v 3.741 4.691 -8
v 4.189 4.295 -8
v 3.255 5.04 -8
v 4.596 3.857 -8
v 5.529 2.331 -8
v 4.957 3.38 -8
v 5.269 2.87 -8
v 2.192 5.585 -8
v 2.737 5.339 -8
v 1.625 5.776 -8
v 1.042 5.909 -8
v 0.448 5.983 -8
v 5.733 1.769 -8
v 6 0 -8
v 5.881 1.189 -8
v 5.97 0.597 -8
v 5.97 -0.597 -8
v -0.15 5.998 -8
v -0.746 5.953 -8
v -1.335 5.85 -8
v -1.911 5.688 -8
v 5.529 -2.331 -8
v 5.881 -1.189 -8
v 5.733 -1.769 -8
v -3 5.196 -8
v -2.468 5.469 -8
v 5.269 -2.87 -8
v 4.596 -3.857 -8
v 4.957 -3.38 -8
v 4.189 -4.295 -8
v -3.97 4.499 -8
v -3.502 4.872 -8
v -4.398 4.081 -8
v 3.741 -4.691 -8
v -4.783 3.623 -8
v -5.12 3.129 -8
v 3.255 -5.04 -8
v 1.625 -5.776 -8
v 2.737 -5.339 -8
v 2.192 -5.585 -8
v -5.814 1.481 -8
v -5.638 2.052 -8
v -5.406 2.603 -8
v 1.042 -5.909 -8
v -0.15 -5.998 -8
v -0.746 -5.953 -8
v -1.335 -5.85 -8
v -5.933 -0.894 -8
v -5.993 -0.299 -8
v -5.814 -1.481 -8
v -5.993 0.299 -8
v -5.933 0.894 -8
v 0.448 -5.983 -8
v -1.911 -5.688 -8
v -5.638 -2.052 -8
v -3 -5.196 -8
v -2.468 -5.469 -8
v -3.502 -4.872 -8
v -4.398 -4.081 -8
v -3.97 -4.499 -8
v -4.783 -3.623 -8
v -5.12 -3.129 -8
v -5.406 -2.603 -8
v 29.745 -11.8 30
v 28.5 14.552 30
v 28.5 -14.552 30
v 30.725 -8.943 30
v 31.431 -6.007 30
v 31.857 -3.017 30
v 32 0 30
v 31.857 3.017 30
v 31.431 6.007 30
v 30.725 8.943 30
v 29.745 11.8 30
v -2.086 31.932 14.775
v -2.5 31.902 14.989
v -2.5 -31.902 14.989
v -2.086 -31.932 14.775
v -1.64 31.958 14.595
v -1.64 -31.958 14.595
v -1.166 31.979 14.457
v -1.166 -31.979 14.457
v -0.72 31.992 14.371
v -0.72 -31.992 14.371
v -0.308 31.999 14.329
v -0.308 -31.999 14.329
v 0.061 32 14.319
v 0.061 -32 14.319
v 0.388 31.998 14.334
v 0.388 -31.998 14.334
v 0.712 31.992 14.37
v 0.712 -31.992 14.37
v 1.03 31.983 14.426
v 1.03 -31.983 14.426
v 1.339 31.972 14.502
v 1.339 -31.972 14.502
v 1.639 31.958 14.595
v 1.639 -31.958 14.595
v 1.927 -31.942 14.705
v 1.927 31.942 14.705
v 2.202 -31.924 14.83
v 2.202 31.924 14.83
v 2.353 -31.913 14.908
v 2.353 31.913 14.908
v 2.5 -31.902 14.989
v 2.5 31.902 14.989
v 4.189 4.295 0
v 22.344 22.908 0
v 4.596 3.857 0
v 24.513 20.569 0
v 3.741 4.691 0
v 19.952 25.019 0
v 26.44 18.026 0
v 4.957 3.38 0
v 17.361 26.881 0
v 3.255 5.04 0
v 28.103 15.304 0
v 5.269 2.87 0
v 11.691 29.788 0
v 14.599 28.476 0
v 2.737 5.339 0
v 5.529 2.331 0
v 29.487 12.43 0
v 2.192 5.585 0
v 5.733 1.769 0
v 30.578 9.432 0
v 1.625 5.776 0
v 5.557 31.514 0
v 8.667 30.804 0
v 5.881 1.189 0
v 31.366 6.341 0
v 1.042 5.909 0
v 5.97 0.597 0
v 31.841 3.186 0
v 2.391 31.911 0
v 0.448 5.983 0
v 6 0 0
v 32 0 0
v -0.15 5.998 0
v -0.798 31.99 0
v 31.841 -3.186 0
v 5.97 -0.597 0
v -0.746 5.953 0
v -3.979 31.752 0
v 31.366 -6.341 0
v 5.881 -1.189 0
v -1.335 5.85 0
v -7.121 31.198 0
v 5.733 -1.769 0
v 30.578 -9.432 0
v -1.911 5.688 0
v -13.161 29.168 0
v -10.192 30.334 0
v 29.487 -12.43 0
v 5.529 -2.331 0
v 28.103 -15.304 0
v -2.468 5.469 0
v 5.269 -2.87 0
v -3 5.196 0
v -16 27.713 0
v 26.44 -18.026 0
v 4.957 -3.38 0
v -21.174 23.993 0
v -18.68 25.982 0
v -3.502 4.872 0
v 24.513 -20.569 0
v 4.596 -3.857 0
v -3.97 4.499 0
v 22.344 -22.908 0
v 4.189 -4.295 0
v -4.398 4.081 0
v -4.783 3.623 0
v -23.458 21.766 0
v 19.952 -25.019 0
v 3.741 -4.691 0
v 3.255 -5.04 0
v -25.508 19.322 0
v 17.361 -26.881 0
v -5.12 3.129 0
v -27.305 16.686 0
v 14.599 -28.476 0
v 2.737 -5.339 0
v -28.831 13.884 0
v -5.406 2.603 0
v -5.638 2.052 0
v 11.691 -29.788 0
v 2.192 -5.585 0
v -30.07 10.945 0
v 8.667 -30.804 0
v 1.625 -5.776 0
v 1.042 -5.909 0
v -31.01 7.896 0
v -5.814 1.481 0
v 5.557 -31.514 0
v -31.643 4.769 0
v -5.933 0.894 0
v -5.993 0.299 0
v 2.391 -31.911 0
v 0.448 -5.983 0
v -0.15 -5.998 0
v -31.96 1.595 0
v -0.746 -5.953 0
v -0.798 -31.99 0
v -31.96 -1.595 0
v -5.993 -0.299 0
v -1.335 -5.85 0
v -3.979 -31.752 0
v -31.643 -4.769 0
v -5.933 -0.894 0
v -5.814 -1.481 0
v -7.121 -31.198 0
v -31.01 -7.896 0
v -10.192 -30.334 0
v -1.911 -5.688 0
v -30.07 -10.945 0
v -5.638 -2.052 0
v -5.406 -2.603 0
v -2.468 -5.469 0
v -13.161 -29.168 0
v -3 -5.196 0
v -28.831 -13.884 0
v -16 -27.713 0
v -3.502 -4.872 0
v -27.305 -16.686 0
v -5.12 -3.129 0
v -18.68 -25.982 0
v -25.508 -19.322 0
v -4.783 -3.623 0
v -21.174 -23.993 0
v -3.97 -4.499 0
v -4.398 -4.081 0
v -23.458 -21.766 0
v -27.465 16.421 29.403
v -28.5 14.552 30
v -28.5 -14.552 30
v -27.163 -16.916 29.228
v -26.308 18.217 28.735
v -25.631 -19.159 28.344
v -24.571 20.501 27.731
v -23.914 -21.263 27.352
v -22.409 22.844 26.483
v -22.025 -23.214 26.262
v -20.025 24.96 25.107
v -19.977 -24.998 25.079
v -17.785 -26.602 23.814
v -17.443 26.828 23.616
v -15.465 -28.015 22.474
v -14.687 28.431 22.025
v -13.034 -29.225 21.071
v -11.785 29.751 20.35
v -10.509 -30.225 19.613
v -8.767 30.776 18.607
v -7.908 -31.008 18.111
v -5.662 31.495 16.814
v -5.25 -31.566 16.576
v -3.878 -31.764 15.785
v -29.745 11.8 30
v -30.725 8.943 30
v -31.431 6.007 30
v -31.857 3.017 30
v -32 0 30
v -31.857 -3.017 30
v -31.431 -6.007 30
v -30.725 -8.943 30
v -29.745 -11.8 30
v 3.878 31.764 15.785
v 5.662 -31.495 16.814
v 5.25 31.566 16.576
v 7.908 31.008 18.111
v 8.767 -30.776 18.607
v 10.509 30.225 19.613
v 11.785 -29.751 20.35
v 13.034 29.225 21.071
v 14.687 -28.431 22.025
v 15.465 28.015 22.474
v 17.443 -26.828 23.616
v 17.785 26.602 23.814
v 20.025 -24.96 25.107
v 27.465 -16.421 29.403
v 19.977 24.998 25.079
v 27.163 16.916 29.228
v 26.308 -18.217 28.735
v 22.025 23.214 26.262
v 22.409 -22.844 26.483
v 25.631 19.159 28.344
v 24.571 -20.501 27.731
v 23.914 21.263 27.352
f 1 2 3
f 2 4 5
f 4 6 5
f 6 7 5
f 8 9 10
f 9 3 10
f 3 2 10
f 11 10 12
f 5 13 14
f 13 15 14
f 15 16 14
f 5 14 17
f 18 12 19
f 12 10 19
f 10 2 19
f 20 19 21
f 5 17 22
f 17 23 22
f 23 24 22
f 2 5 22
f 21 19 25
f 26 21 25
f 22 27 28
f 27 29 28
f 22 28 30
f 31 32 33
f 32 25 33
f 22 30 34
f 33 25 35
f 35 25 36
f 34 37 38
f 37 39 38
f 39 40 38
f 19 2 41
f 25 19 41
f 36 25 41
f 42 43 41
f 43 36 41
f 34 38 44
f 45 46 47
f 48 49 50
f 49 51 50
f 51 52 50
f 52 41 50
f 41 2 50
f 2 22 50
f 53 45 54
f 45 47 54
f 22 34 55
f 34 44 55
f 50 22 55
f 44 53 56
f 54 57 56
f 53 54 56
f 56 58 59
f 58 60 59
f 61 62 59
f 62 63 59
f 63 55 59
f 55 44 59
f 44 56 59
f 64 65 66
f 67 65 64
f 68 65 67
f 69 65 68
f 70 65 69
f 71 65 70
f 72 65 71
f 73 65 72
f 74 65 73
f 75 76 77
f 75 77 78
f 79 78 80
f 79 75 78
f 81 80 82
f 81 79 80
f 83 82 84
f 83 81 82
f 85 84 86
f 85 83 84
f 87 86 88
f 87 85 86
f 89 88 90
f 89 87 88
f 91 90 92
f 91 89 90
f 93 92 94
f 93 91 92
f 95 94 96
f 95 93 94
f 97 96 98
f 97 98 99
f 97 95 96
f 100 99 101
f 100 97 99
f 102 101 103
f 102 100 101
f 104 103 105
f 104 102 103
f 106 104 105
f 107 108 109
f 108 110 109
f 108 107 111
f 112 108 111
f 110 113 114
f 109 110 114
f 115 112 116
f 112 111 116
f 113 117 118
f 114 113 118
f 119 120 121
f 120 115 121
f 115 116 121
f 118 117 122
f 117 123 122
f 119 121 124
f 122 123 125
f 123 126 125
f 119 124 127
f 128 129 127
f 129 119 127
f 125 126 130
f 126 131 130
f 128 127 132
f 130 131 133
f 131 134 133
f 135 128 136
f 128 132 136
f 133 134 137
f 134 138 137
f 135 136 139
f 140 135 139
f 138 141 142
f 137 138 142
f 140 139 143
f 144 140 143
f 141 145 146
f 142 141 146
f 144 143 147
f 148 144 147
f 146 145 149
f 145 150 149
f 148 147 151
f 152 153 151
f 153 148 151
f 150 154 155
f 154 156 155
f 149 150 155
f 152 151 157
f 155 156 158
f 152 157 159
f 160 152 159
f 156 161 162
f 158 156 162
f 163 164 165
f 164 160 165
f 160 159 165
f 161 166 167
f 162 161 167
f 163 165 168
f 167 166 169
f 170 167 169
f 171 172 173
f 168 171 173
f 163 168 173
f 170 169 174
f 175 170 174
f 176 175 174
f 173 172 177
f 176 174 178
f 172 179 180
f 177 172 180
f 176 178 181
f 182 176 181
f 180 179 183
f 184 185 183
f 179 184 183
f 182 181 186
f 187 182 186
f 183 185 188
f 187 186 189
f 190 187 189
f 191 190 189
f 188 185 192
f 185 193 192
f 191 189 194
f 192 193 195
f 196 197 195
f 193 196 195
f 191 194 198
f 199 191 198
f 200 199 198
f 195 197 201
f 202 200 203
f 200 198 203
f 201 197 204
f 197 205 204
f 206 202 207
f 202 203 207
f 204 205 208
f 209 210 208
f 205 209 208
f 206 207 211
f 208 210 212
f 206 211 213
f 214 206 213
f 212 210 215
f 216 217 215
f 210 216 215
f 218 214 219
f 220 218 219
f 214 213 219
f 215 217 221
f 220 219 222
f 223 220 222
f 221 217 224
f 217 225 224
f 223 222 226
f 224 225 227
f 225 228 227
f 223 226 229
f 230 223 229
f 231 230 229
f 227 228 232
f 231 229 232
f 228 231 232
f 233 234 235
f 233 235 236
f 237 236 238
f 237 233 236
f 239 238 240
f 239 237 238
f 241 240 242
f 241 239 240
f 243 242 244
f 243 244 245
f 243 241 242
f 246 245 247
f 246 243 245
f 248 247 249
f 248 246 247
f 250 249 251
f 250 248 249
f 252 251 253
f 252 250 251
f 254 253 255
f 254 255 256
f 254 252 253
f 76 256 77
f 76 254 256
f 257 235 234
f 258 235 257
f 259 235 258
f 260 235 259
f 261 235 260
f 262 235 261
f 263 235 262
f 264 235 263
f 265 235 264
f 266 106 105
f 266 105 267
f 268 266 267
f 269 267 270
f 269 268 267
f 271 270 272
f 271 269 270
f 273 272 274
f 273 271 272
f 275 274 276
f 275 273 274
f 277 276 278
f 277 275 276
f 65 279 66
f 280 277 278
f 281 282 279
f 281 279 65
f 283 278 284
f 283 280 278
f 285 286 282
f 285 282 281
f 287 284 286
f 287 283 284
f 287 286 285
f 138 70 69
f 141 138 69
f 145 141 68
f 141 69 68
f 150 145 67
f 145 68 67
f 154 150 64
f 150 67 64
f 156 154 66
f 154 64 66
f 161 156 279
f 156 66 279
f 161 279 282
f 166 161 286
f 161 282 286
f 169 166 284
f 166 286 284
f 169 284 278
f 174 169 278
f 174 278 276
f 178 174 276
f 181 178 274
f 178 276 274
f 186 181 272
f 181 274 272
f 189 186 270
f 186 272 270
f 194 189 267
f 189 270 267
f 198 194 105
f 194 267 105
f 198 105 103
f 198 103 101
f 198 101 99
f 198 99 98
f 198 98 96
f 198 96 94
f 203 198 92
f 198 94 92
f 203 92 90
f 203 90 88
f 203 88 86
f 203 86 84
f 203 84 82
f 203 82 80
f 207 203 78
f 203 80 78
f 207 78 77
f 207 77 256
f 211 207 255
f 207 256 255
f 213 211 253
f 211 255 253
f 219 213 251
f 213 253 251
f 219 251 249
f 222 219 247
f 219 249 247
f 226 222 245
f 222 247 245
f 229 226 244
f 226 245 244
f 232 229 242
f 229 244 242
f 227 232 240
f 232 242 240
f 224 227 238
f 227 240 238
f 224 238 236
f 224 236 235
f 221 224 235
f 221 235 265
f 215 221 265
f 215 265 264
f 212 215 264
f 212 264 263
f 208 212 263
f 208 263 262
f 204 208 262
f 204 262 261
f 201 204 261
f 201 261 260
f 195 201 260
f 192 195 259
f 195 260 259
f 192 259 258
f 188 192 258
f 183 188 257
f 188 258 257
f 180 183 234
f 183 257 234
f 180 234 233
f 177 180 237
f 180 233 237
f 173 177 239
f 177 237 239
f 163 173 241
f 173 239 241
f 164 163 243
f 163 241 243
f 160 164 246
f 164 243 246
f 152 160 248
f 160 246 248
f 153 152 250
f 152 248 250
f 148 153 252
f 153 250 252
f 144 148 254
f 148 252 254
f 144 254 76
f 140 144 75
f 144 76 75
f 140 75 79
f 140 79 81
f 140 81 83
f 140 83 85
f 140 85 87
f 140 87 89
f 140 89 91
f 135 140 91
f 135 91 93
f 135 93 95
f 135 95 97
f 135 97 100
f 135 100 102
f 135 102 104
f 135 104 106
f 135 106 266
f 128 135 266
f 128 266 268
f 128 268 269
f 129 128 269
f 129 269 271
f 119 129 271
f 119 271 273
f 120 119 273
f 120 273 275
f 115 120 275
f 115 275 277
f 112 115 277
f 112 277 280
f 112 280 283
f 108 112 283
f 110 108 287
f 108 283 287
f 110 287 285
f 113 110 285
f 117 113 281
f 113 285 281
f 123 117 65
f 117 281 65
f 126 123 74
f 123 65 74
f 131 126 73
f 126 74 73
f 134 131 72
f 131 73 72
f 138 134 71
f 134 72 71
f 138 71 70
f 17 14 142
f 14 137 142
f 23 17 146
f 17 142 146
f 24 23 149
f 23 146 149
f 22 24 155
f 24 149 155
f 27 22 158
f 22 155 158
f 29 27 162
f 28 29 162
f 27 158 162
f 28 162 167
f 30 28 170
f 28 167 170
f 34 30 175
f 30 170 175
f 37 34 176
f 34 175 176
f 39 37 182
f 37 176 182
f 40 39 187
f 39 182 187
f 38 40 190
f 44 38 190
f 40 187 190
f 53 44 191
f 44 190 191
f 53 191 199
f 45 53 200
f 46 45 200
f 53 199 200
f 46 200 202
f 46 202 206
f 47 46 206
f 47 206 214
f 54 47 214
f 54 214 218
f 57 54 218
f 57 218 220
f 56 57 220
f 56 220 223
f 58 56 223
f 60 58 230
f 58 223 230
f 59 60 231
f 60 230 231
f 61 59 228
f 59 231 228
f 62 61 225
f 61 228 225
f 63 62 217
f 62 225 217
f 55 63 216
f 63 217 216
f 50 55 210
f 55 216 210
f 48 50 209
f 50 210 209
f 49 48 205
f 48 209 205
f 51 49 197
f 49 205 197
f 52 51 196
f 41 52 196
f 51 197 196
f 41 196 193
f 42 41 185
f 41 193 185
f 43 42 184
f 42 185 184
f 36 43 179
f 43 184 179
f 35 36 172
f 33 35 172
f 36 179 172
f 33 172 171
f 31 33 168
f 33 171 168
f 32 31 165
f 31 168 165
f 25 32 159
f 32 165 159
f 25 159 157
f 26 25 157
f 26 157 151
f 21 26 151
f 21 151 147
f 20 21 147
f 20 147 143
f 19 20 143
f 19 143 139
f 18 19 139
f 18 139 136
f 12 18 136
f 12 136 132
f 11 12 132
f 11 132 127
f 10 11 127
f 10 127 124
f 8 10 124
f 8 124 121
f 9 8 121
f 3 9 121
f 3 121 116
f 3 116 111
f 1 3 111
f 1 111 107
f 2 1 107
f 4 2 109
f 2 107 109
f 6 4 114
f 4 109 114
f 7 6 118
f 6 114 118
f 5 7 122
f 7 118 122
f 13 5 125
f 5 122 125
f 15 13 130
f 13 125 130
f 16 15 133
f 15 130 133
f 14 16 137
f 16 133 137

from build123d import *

# Parameters (mm, degrees)
CUT_EXTRUDE1_DEPTH = 35


with BuildPart() as part:
    # Sketch1 → Revolve1 (revolve)
    with BuildSketch(Plane(origin=(0, 0, 0), x_dir=(0, 0, -1), z_dir=(1, 0, 0)), mode=Mode.PRIVATE) as revolve1_sk:
        Polygon((8, 0), (8, 6), (0, 6), (0, 32), (-30, 32), (-30, 0), align=None)
    revolve(revolve1_sk.sketch.rotate(Axis((0, 0, -8), (0, 0, -1)), 90), axis=Axis((0, 0, -8), (0, 0, -1)))

    # Sketch2 → Cut-Extrude1 (cut, symmetric)
    with BuildSketch(Plane(origin=(0, 0, 0), x_dir=(1, 0, 0), z_dir=(0, 1, 0))):
        with BuildLine():
            Line((-28.5, -30), (-2.5, -14.988893001))
            ThreePointArc((-2.5, -14.988893001), (0, -14.31902002), (2.5, -14.988893001))
            Line((2.5, -14.988893001), (28.5, -30))
            Line((28.5, -30), (-28.5, -30))
        make_face()
    extrude(amount=CUT_EXTRUDE1_DEPTH, both=True, mode=Mode.SUBTRACT)


solid = part.part
